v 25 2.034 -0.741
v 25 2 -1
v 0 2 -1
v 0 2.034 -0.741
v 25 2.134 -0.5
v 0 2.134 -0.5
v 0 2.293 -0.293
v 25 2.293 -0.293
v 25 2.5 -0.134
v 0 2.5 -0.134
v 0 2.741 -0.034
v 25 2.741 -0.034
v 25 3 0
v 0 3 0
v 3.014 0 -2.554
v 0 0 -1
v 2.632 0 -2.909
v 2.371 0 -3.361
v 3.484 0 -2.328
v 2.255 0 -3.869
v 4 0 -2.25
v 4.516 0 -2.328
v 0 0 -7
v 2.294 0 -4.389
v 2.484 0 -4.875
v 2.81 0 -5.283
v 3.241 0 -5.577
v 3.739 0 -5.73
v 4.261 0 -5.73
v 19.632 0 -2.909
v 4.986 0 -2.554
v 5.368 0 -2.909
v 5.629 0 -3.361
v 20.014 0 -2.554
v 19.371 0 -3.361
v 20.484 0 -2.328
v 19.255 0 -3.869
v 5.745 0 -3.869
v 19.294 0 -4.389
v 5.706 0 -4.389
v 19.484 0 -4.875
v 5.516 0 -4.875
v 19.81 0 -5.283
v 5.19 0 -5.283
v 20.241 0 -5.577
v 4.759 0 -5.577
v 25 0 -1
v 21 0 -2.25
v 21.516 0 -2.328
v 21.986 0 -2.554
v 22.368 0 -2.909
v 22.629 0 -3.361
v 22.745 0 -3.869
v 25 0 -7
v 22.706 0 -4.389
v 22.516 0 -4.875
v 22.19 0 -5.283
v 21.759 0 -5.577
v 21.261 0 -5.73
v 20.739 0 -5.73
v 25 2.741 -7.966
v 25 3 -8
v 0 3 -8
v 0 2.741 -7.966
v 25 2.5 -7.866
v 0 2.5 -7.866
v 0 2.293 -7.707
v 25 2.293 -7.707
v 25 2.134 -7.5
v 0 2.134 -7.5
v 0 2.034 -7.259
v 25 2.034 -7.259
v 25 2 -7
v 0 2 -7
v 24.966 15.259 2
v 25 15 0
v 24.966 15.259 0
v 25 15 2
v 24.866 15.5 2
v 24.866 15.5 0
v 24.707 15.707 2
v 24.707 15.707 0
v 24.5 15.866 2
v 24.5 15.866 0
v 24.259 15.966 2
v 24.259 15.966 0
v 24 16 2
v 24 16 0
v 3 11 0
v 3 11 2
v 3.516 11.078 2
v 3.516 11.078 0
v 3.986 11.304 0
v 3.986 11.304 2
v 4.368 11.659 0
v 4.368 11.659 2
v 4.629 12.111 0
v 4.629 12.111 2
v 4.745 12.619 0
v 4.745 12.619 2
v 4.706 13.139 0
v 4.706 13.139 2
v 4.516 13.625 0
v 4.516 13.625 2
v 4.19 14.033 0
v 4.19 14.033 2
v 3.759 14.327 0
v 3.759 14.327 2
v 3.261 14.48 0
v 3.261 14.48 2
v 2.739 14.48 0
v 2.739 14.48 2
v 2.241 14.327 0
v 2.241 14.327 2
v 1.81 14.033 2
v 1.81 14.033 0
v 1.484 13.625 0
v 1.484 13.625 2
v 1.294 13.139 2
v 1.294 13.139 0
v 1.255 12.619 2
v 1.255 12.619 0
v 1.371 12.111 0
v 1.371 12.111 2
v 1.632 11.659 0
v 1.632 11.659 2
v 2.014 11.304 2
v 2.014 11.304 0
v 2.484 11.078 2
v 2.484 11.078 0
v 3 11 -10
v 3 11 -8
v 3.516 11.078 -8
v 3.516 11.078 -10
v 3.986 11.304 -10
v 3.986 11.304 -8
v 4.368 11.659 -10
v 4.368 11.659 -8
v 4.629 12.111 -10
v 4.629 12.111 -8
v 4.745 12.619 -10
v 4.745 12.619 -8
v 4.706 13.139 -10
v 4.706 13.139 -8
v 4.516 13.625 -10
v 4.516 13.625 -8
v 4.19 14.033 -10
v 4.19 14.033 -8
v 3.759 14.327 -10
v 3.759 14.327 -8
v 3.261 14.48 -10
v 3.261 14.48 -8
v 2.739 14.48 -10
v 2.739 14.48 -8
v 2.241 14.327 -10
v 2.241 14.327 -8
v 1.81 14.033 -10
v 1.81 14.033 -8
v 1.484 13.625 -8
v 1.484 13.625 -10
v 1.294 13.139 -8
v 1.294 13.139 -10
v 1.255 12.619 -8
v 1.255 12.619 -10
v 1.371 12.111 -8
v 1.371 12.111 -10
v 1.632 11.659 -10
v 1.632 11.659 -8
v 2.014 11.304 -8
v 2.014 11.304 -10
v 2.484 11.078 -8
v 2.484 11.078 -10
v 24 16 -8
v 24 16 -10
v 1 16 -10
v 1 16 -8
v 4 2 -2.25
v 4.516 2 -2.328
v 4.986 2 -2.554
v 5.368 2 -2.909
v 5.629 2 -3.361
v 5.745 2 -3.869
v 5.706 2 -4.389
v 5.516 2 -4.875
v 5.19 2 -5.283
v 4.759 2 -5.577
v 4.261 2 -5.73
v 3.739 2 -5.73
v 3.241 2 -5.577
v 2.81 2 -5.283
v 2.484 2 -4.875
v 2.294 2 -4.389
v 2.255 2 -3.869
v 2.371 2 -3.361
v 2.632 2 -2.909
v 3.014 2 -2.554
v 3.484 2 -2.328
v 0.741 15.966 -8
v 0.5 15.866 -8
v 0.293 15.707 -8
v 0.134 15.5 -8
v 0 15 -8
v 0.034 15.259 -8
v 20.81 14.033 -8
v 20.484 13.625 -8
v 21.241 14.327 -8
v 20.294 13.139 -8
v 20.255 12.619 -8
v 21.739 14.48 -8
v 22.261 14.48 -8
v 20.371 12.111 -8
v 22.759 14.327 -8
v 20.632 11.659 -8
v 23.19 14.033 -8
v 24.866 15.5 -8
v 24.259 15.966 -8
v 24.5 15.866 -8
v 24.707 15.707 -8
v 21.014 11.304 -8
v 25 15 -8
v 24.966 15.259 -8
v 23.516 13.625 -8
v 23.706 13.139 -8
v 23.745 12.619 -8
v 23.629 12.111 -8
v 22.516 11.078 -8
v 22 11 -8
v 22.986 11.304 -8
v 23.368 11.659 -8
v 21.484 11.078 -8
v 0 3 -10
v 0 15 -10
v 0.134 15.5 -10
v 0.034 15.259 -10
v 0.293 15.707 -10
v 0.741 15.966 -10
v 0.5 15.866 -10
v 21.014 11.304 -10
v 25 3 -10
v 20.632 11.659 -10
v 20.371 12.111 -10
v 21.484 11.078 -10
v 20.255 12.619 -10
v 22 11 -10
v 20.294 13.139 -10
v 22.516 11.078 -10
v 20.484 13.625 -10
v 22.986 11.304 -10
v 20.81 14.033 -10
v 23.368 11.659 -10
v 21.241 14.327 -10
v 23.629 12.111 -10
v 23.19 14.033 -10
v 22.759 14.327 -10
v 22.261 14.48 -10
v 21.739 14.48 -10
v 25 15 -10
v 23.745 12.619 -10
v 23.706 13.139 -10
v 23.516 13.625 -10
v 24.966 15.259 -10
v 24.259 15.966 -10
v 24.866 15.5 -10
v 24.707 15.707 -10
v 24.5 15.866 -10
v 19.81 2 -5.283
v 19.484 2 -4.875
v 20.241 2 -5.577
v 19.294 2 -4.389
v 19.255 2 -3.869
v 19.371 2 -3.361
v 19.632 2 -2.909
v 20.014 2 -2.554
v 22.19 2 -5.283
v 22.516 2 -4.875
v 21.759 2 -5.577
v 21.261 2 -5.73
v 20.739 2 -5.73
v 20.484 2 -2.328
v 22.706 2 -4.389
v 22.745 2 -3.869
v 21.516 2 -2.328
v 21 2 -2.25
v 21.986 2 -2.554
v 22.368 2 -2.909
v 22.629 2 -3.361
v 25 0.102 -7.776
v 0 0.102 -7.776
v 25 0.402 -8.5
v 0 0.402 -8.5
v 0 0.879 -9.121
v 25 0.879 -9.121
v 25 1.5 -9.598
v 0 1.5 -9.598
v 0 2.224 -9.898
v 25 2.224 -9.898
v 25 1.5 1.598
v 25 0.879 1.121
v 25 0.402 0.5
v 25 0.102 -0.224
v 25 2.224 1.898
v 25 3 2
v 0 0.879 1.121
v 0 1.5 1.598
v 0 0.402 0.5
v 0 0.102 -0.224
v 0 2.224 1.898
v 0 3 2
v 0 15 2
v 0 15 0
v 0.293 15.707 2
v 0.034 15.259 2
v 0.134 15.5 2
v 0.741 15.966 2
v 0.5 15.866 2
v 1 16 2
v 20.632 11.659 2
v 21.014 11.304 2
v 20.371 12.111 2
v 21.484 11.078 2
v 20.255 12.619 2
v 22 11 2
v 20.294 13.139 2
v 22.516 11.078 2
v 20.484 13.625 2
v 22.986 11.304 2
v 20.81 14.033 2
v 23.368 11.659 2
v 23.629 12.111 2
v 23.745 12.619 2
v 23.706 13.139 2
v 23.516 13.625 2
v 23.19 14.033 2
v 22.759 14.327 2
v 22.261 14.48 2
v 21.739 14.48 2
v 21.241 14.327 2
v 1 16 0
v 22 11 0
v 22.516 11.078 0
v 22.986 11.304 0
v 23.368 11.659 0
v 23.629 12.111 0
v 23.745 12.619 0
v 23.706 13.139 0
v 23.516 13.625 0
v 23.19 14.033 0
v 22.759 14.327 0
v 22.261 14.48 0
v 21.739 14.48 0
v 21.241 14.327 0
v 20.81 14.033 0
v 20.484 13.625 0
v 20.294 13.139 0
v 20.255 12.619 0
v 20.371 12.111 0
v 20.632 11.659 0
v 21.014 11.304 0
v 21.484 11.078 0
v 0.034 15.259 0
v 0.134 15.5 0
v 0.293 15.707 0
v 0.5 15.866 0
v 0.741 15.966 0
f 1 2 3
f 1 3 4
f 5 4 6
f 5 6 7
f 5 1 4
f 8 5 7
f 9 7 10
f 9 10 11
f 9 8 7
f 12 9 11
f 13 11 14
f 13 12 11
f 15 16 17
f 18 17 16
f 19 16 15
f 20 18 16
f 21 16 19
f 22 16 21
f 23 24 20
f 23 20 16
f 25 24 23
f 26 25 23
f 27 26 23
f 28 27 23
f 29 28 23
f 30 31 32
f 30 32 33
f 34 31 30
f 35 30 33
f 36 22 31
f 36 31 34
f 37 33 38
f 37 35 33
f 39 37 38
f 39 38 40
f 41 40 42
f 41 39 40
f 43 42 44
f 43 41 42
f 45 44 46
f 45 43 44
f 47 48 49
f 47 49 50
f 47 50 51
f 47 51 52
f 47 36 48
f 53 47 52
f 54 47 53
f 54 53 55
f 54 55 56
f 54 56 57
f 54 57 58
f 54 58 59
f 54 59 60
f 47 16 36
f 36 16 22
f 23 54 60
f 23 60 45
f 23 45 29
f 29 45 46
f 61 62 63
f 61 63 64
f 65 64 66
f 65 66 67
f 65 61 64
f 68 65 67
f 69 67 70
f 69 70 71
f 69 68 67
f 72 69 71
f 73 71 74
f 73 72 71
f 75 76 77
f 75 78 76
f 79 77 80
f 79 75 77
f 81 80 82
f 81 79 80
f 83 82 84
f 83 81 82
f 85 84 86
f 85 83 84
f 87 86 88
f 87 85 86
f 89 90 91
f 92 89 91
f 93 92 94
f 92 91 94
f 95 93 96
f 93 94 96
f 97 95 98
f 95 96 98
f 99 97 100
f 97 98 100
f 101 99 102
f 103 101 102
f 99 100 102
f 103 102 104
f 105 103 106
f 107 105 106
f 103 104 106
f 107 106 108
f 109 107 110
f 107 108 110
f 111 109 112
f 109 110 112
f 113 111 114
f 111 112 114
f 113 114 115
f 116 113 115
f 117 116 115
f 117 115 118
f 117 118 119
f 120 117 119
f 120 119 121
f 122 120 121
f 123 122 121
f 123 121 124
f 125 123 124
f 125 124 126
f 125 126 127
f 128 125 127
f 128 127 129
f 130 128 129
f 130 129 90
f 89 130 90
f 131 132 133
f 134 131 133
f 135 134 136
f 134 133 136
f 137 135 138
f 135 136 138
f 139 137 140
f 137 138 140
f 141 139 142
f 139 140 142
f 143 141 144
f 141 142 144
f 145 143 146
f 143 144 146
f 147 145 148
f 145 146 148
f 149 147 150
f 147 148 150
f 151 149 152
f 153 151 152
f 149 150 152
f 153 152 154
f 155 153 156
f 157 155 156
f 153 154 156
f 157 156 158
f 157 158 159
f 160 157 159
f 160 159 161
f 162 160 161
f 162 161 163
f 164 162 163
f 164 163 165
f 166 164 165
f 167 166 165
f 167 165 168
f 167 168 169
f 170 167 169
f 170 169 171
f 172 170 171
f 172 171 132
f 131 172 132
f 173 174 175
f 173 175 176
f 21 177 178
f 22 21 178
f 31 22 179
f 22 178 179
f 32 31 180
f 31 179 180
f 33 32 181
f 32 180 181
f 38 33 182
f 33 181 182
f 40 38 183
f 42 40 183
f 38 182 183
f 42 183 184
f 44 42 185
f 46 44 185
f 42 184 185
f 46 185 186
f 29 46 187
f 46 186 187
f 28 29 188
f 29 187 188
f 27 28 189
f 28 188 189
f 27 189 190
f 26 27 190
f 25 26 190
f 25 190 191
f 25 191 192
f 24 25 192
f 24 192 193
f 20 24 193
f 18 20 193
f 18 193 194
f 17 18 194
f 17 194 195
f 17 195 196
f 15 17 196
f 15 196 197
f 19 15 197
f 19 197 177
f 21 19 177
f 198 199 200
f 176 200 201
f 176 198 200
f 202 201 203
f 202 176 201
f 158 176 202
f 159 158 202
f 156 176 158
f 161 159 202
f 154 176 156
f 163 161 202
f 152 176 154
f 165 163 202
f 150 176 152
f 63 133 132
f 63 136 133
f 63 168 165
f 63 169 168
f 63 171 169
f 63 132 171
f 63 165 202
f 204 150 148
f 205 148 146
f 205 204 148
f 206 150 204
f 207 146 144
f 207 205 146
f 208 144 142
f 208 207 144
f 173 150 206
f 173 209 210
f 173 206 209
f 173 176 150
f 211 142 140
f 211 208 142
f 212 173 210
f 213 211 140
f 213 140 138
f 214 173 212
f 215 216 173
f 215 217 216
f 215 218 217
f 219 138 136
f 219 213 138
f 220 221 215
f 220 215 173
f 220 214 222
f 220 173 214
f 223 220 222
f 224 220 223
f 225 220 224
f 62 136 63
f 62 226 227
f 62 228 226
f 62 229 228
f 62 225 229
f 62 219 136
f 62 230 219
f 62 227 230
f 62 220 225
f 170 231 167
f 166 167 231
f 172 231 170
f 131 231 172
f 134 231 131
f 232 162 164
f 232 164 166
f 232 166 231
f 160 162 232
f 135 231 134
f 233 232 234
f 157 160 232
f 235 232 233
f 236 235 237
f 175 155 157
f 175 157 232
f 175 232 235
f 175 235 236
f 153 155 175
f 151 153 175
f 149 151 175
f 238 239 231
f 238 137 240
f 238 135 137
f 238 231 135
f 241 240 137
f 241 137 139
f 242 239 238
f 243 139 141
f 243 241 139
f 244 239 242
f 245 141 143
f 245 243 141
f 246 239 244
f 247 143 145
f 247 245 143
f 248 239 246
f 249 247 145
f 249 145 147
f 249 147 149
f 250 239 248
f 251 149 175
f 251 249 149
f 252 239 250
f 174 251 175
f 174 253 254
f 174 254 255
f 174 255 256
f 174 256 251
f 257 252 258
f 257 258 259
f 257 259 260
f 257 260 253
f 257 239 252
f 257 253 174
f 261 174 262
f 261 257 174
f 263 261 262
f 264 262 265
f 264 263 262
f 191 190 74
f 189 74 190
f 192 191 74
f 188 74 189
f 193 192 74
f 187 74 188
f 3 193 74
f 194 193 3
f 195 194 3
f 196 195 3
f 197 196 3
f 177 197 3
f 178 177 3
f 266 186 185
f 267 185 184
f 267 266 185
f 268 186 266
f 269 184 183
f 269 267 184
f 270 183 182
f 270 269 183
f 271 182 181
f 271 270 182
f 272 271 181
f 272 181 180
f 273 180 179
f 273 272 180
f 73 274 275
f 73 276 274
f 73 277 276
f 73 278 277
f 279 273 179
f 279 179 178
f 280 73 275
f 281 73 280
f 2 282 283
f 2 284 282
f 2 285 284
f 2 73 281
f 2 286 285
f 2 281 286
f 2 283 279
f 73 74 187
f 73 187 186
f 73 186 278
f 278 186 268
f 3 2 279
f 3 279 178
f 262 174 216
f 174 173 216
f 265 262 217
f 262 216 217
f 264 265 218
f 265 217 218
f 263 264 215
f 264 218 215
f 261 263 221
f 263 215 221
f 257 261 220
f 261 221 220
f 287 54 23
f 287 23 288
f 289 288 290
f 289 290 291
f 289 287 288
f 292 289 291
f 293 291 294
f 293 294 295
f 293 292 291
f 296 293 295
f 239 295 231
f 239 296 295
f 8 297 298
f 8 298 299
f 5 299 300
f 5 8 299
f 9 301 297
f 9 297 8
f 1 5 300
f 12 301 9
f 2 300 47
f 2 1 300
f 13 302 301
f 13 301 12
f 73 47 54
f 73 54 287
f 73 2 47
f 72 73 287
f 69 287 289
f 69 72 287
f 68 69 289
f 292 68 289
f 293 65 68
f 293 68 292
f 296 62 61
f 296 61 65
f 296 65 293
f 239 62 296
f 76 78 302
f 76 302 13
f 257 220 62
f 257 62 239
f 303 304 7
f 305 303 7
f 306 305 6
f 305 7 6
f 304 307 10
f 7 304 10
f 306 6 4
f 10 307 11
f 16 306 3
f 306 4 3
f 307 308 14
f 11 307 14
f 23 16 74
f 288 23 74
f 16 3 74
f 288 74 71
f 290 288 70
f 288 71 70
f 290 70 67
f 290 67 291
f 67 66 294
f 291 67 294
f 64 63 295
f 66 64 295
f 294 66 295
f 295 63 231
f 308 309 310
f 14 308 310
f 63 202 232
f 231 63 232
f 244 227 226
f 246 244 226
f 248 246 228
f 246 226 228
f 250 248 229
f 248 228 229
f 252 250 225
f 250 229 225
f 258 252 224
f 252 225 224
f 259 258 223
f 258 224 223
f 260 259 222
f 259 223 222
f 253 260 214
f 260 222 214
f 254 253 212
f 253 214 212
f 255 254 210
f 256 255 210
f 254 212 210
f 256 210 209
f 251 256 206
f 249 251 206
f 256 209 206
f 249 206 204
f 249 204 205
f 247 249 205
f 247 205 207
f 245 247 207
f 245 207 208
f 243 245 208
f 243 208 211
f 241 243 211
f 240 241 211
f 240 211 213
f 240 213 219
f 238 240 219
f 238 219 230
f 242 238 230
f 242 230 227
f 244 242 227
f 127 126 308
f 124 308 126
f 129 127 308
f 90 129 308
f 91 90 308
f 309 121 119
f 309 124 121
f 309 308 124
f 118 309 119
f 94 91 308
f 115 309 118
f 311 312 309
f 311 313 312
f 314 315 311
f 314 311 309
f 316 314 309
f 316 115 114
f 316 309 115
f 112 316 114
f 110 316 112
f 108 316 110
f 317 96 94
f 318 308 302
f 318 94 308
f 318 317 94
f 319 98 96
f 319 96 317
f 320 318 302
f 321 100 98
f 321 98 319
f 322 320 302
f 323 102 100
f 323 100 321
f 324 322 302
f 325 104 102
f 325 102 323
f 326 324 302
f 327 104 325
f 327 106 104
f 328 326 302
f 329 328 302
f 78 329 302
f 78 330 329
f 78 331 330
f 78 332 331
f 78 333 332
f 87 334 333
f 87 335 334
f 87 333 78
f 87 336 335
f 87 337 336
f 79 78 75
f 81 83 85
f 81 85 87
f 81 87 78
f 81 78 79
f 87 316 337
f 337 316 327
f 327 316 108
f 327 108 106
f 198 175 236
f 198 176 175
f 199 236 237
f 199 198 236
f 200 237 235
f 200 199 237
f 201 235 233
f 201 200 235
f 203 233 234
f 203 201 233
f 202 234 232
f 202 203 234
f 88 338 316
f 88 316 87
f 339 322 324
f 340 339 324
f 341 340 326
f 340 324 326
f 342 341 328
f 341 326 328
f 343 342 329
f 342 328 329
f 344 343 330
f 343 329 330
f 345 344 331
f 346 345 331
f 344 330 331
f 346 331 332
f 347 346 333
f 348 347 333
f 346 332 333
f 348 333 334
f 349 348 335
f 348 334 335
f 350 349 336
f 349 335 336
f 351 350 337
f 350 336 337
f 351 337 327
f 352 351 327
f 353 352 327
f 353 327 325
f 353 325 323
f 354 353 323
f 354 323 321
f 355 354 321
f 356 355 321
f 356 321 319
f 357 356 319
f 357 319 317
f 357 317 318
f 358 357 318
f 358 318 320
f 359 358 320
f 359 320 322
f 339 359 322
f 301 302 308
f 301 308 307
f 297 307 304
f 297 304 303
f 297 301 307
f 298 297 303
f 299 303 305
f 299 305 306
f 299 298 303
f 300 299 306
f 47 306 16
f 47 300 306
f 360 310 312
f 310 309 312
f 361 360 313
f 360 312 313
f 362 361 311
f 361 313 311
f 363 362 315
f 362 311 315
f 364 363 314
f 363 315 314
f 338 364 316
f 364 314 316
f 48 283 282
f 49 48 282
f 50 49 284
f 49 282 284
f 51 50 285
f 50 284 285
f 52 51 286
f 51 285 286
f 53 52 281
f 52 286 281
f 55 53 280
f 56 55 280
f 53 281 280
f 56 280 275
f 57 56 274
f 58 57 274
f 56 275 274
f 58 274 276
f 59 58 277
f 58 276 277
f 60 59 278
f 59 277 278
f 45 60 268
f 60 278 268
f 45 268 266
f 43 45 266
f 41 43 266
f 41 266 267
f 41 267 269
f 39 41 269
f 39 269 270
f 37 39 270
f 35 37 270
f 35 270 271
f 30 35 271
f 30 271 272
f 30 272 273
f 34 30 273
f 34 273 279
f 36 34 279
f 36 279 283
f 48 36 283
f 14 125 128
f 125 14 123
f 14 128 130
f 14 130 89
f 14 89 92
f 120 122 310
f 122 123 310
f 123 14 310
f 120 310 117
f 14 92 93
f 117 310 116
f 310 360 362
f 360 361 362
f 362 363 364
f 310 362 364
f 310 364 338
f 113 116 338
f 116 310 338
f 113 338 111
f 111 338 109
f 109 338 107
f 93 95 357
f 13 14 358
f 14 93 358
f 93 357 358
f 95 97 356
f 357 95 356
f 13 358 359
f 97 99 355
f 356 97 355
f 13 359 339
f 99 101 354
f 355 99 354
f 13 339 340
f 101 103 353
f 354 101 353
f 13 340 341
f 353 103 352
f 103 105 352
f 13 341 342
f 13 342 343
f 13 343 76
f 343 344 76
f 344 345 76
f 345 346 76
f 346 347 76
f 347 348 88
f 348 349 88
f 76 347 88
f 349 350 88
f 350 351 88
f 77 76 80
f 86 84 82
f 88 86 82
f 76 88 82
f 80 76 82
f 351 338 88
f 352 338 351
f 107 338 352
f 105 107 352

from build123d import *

# Parameters (mm, degrees)
ESBO_O9_W                      = 25
ESBO_O9_H                      = 16
FLANGE_BASE2_DEPTH             = 2
ARESTA_FLANGE2_STRIP_W         = 10
ARESTA_FLANGE2_STRIP_H         = 2
ARESTA_FLANGE2_STRIP_CUT_DEPTH = 25
ARESTA_FLANGE2_DEPTH           = 25
ARESTA_FLANGE3_STRIP_W         = 10
ARESTA_FLANGE3_STRIP_H         = 2
ARESTA_FLANGE3_STRIP_CUT_DEPTH = 25
ARESTA_FLANGE3_DEPTH           = 25
FILETE1_R                      = 1
CORTE_EXTRUS_O1_REACH          = 34.016
ESBO_O21_R                     = 1.75
ESBO_O22_R                     = 1.75
CORTE_EXTRUS_O2_DEPTH          = 10


# Sheet-metal steps are written as plain solids
with BuildPart() as part:
    # Esboço9 → Flange-base2 (new body)
    with BuildSketch(Plane.XY):
        with Locations((12.5, 8)):
            Rectangle(ESBO_O9_W, ESBO_O9_H)
    extrude(amount=FLANGE_BASE2_DEPTH)

    # Aresta-Flange2 strip (across the edge) → Aresta-Flange2 strip cut (cut)
    with BuildSketch(Plane(origin=(25, 0, 0), x_dir=(0, 1, 0), z_dir=(-1, 0, 0))):
        with Locations((-2, -1)):
            Rectangle(ARESTA_FLANGE2_STRIP_W, ARESTA_FLANGE2_STRIP_H)
    extrude(amount=ARESTA_FLANGE2_STRIP_CUT_DEPTH, mode=Mode.SUBTRACT)

    # Aresta-Flange2 section (across the edge) → Aresta-Flange2 (add)
    with BuildSketch(Plane(origin=(25, 0, 0), x_dir=(0, 1, 0), z_dir=(-1, 0, 0))):
        with BuildLine():
            Line((0, 1), (0, 10))
            Line((0, 10), (2, 10))
            Line((2, 10), (2, 1))
            ThreePointArc((2, 1), (2.292893219, 0.292893219), (3, 0))
            Line((3, 0), (3, -2))
            ThreePointArc((3, -2), (0.878679656, -1.121320344), (0, 1))
        make_face()
    extrude(amount=ARESTA_FLANGE2_DEPTH)

    # Aresta-Flange3 strip (across the edge) → Aresta-Flange3 strip cut (cut)
    with BuildSketch(Plane(origin=(25, 2, -10), x_dir=(0, 0, 1), z_dir=(-1, 0, 0))):
        with Locations((-2, -1)):
            Rectangle(ARESTA_FLANGE3_STRIP_W, ARESTA_FLANGE3_STRIP_H)
    extrude(amount=ARESTA_FLANGE3_STRIP_CUT_DEPTH, mode=Mode.SUBTRACT)

    # Aresta-Flange3 section (across the edge) → Aresta-Flange3 (add)
    with BuildSketch(Plane(origin=(25, 2, -10), x_dir=(0, 0, 1), z_dir=(-1, 0, 0))):
        with BuildLine():
            Line((0, 1), (0, 14))
            Line((0, 14), (2, 14))
            Line((2, 14), (2, 1))
            ThreePointArc((2, 1), (2.292893219, 0.292893219), (3, 0))
            Line((3, 0), (3, -2))
            ThreePointArc((3, -2), (0.878679656, -1.121320344), (0, 1))
        make_face()
    extrude(amount=ARESTA_FLANGE3_DEPTH)

    # Filete1
    filete1_edges = [part.edges().sort_by_distance(p)[0] for p in [
        (25, 16, -9),
        (0, 16, -9),
        (0, 16, 1),
        (25, 16, 1),
    ]]
    fillet(filete1_edges, radius=FILETE1_R)

    # Corte-extrusão1: up to this face of the body (flat: up to its plane)
    corte_extrus_o1_end = Plane(part.part.faces().sort_by_distance((12.5, 9.491699951, -10))[0])
    # Esboço21 → Corte-extrusão1 (cut, up to the picked face)
    with BuildSketch(Plane.XY.offset(2), mode=Mode.PRIVATE) as corte_extrus_o1_sk1:
        with Locations(Location((3, 12.75, 0), (0, 0, 270))):
            Circle(ESBO_O21_R)
    corte_extrus_o1_tool1 = split(extrude(corte_extrus_o1_sk1.sketch, amount=-CORTE_EXTRUS_O1_REACH, mode=Mode.PRIVATE), bisect_by=corte_extrus_o1_end, keep=Keep.BOTH, mode=Mode.PRIVATE)
    # Esboço21 → Corte-extrusão1 (cut, up to the picked face)
    with BuildSketch(Plane.XY.offset(2), mode=Mode.PRIVATE) as corte_extrus_o1_sk2:
        with Locations(Location((22, 12.75, 0), (0, 0, 270))):
            Circle(ESBO_O21_R)
    corte_extrus_o1_tool2 = split(extrude(corte_extrus_o1_sk2.sketch, amount=-CORTE_EXTRUS_O1_REACH, mode=Mode.PRIVATE), bisect_by=corte_extrus_o1_end, keep=Keep.BOTH, mode=Mode.PRIVATE)
    add(corte_extrus_o1_tool1.solids().sort_by(Axis((3, 12.75, 2), (0, 0, -1)))[0], mode=Mode.SUBTRACT)
    add(corte_extrus_o1_tool2.solids().sort_by(Axis((22, 12.75, 2), (0, 0, -1)))[0], mode=Mode.SUBTRACT)

    # Esboço22 → Corte-extrusão2 (cut)
    with BuildSketch(Plane(origin=(0, 2, 0), x_dir=(1, 0, 0), z_dir=(0, 1, 0))):
        with Locations(Location((4, 4, 0), (0, 0, 270))):
            Circle(ESBO_O22_R)
        with Locations(Location((21, 4, 0), (0, 0, 270))):
            Circle(ESBO_O22_R)
    extrude(amount=-CORTE_EXTRUS_O2_DEPTH, mode=Mode.SUBTRACT)


solid = part.part
